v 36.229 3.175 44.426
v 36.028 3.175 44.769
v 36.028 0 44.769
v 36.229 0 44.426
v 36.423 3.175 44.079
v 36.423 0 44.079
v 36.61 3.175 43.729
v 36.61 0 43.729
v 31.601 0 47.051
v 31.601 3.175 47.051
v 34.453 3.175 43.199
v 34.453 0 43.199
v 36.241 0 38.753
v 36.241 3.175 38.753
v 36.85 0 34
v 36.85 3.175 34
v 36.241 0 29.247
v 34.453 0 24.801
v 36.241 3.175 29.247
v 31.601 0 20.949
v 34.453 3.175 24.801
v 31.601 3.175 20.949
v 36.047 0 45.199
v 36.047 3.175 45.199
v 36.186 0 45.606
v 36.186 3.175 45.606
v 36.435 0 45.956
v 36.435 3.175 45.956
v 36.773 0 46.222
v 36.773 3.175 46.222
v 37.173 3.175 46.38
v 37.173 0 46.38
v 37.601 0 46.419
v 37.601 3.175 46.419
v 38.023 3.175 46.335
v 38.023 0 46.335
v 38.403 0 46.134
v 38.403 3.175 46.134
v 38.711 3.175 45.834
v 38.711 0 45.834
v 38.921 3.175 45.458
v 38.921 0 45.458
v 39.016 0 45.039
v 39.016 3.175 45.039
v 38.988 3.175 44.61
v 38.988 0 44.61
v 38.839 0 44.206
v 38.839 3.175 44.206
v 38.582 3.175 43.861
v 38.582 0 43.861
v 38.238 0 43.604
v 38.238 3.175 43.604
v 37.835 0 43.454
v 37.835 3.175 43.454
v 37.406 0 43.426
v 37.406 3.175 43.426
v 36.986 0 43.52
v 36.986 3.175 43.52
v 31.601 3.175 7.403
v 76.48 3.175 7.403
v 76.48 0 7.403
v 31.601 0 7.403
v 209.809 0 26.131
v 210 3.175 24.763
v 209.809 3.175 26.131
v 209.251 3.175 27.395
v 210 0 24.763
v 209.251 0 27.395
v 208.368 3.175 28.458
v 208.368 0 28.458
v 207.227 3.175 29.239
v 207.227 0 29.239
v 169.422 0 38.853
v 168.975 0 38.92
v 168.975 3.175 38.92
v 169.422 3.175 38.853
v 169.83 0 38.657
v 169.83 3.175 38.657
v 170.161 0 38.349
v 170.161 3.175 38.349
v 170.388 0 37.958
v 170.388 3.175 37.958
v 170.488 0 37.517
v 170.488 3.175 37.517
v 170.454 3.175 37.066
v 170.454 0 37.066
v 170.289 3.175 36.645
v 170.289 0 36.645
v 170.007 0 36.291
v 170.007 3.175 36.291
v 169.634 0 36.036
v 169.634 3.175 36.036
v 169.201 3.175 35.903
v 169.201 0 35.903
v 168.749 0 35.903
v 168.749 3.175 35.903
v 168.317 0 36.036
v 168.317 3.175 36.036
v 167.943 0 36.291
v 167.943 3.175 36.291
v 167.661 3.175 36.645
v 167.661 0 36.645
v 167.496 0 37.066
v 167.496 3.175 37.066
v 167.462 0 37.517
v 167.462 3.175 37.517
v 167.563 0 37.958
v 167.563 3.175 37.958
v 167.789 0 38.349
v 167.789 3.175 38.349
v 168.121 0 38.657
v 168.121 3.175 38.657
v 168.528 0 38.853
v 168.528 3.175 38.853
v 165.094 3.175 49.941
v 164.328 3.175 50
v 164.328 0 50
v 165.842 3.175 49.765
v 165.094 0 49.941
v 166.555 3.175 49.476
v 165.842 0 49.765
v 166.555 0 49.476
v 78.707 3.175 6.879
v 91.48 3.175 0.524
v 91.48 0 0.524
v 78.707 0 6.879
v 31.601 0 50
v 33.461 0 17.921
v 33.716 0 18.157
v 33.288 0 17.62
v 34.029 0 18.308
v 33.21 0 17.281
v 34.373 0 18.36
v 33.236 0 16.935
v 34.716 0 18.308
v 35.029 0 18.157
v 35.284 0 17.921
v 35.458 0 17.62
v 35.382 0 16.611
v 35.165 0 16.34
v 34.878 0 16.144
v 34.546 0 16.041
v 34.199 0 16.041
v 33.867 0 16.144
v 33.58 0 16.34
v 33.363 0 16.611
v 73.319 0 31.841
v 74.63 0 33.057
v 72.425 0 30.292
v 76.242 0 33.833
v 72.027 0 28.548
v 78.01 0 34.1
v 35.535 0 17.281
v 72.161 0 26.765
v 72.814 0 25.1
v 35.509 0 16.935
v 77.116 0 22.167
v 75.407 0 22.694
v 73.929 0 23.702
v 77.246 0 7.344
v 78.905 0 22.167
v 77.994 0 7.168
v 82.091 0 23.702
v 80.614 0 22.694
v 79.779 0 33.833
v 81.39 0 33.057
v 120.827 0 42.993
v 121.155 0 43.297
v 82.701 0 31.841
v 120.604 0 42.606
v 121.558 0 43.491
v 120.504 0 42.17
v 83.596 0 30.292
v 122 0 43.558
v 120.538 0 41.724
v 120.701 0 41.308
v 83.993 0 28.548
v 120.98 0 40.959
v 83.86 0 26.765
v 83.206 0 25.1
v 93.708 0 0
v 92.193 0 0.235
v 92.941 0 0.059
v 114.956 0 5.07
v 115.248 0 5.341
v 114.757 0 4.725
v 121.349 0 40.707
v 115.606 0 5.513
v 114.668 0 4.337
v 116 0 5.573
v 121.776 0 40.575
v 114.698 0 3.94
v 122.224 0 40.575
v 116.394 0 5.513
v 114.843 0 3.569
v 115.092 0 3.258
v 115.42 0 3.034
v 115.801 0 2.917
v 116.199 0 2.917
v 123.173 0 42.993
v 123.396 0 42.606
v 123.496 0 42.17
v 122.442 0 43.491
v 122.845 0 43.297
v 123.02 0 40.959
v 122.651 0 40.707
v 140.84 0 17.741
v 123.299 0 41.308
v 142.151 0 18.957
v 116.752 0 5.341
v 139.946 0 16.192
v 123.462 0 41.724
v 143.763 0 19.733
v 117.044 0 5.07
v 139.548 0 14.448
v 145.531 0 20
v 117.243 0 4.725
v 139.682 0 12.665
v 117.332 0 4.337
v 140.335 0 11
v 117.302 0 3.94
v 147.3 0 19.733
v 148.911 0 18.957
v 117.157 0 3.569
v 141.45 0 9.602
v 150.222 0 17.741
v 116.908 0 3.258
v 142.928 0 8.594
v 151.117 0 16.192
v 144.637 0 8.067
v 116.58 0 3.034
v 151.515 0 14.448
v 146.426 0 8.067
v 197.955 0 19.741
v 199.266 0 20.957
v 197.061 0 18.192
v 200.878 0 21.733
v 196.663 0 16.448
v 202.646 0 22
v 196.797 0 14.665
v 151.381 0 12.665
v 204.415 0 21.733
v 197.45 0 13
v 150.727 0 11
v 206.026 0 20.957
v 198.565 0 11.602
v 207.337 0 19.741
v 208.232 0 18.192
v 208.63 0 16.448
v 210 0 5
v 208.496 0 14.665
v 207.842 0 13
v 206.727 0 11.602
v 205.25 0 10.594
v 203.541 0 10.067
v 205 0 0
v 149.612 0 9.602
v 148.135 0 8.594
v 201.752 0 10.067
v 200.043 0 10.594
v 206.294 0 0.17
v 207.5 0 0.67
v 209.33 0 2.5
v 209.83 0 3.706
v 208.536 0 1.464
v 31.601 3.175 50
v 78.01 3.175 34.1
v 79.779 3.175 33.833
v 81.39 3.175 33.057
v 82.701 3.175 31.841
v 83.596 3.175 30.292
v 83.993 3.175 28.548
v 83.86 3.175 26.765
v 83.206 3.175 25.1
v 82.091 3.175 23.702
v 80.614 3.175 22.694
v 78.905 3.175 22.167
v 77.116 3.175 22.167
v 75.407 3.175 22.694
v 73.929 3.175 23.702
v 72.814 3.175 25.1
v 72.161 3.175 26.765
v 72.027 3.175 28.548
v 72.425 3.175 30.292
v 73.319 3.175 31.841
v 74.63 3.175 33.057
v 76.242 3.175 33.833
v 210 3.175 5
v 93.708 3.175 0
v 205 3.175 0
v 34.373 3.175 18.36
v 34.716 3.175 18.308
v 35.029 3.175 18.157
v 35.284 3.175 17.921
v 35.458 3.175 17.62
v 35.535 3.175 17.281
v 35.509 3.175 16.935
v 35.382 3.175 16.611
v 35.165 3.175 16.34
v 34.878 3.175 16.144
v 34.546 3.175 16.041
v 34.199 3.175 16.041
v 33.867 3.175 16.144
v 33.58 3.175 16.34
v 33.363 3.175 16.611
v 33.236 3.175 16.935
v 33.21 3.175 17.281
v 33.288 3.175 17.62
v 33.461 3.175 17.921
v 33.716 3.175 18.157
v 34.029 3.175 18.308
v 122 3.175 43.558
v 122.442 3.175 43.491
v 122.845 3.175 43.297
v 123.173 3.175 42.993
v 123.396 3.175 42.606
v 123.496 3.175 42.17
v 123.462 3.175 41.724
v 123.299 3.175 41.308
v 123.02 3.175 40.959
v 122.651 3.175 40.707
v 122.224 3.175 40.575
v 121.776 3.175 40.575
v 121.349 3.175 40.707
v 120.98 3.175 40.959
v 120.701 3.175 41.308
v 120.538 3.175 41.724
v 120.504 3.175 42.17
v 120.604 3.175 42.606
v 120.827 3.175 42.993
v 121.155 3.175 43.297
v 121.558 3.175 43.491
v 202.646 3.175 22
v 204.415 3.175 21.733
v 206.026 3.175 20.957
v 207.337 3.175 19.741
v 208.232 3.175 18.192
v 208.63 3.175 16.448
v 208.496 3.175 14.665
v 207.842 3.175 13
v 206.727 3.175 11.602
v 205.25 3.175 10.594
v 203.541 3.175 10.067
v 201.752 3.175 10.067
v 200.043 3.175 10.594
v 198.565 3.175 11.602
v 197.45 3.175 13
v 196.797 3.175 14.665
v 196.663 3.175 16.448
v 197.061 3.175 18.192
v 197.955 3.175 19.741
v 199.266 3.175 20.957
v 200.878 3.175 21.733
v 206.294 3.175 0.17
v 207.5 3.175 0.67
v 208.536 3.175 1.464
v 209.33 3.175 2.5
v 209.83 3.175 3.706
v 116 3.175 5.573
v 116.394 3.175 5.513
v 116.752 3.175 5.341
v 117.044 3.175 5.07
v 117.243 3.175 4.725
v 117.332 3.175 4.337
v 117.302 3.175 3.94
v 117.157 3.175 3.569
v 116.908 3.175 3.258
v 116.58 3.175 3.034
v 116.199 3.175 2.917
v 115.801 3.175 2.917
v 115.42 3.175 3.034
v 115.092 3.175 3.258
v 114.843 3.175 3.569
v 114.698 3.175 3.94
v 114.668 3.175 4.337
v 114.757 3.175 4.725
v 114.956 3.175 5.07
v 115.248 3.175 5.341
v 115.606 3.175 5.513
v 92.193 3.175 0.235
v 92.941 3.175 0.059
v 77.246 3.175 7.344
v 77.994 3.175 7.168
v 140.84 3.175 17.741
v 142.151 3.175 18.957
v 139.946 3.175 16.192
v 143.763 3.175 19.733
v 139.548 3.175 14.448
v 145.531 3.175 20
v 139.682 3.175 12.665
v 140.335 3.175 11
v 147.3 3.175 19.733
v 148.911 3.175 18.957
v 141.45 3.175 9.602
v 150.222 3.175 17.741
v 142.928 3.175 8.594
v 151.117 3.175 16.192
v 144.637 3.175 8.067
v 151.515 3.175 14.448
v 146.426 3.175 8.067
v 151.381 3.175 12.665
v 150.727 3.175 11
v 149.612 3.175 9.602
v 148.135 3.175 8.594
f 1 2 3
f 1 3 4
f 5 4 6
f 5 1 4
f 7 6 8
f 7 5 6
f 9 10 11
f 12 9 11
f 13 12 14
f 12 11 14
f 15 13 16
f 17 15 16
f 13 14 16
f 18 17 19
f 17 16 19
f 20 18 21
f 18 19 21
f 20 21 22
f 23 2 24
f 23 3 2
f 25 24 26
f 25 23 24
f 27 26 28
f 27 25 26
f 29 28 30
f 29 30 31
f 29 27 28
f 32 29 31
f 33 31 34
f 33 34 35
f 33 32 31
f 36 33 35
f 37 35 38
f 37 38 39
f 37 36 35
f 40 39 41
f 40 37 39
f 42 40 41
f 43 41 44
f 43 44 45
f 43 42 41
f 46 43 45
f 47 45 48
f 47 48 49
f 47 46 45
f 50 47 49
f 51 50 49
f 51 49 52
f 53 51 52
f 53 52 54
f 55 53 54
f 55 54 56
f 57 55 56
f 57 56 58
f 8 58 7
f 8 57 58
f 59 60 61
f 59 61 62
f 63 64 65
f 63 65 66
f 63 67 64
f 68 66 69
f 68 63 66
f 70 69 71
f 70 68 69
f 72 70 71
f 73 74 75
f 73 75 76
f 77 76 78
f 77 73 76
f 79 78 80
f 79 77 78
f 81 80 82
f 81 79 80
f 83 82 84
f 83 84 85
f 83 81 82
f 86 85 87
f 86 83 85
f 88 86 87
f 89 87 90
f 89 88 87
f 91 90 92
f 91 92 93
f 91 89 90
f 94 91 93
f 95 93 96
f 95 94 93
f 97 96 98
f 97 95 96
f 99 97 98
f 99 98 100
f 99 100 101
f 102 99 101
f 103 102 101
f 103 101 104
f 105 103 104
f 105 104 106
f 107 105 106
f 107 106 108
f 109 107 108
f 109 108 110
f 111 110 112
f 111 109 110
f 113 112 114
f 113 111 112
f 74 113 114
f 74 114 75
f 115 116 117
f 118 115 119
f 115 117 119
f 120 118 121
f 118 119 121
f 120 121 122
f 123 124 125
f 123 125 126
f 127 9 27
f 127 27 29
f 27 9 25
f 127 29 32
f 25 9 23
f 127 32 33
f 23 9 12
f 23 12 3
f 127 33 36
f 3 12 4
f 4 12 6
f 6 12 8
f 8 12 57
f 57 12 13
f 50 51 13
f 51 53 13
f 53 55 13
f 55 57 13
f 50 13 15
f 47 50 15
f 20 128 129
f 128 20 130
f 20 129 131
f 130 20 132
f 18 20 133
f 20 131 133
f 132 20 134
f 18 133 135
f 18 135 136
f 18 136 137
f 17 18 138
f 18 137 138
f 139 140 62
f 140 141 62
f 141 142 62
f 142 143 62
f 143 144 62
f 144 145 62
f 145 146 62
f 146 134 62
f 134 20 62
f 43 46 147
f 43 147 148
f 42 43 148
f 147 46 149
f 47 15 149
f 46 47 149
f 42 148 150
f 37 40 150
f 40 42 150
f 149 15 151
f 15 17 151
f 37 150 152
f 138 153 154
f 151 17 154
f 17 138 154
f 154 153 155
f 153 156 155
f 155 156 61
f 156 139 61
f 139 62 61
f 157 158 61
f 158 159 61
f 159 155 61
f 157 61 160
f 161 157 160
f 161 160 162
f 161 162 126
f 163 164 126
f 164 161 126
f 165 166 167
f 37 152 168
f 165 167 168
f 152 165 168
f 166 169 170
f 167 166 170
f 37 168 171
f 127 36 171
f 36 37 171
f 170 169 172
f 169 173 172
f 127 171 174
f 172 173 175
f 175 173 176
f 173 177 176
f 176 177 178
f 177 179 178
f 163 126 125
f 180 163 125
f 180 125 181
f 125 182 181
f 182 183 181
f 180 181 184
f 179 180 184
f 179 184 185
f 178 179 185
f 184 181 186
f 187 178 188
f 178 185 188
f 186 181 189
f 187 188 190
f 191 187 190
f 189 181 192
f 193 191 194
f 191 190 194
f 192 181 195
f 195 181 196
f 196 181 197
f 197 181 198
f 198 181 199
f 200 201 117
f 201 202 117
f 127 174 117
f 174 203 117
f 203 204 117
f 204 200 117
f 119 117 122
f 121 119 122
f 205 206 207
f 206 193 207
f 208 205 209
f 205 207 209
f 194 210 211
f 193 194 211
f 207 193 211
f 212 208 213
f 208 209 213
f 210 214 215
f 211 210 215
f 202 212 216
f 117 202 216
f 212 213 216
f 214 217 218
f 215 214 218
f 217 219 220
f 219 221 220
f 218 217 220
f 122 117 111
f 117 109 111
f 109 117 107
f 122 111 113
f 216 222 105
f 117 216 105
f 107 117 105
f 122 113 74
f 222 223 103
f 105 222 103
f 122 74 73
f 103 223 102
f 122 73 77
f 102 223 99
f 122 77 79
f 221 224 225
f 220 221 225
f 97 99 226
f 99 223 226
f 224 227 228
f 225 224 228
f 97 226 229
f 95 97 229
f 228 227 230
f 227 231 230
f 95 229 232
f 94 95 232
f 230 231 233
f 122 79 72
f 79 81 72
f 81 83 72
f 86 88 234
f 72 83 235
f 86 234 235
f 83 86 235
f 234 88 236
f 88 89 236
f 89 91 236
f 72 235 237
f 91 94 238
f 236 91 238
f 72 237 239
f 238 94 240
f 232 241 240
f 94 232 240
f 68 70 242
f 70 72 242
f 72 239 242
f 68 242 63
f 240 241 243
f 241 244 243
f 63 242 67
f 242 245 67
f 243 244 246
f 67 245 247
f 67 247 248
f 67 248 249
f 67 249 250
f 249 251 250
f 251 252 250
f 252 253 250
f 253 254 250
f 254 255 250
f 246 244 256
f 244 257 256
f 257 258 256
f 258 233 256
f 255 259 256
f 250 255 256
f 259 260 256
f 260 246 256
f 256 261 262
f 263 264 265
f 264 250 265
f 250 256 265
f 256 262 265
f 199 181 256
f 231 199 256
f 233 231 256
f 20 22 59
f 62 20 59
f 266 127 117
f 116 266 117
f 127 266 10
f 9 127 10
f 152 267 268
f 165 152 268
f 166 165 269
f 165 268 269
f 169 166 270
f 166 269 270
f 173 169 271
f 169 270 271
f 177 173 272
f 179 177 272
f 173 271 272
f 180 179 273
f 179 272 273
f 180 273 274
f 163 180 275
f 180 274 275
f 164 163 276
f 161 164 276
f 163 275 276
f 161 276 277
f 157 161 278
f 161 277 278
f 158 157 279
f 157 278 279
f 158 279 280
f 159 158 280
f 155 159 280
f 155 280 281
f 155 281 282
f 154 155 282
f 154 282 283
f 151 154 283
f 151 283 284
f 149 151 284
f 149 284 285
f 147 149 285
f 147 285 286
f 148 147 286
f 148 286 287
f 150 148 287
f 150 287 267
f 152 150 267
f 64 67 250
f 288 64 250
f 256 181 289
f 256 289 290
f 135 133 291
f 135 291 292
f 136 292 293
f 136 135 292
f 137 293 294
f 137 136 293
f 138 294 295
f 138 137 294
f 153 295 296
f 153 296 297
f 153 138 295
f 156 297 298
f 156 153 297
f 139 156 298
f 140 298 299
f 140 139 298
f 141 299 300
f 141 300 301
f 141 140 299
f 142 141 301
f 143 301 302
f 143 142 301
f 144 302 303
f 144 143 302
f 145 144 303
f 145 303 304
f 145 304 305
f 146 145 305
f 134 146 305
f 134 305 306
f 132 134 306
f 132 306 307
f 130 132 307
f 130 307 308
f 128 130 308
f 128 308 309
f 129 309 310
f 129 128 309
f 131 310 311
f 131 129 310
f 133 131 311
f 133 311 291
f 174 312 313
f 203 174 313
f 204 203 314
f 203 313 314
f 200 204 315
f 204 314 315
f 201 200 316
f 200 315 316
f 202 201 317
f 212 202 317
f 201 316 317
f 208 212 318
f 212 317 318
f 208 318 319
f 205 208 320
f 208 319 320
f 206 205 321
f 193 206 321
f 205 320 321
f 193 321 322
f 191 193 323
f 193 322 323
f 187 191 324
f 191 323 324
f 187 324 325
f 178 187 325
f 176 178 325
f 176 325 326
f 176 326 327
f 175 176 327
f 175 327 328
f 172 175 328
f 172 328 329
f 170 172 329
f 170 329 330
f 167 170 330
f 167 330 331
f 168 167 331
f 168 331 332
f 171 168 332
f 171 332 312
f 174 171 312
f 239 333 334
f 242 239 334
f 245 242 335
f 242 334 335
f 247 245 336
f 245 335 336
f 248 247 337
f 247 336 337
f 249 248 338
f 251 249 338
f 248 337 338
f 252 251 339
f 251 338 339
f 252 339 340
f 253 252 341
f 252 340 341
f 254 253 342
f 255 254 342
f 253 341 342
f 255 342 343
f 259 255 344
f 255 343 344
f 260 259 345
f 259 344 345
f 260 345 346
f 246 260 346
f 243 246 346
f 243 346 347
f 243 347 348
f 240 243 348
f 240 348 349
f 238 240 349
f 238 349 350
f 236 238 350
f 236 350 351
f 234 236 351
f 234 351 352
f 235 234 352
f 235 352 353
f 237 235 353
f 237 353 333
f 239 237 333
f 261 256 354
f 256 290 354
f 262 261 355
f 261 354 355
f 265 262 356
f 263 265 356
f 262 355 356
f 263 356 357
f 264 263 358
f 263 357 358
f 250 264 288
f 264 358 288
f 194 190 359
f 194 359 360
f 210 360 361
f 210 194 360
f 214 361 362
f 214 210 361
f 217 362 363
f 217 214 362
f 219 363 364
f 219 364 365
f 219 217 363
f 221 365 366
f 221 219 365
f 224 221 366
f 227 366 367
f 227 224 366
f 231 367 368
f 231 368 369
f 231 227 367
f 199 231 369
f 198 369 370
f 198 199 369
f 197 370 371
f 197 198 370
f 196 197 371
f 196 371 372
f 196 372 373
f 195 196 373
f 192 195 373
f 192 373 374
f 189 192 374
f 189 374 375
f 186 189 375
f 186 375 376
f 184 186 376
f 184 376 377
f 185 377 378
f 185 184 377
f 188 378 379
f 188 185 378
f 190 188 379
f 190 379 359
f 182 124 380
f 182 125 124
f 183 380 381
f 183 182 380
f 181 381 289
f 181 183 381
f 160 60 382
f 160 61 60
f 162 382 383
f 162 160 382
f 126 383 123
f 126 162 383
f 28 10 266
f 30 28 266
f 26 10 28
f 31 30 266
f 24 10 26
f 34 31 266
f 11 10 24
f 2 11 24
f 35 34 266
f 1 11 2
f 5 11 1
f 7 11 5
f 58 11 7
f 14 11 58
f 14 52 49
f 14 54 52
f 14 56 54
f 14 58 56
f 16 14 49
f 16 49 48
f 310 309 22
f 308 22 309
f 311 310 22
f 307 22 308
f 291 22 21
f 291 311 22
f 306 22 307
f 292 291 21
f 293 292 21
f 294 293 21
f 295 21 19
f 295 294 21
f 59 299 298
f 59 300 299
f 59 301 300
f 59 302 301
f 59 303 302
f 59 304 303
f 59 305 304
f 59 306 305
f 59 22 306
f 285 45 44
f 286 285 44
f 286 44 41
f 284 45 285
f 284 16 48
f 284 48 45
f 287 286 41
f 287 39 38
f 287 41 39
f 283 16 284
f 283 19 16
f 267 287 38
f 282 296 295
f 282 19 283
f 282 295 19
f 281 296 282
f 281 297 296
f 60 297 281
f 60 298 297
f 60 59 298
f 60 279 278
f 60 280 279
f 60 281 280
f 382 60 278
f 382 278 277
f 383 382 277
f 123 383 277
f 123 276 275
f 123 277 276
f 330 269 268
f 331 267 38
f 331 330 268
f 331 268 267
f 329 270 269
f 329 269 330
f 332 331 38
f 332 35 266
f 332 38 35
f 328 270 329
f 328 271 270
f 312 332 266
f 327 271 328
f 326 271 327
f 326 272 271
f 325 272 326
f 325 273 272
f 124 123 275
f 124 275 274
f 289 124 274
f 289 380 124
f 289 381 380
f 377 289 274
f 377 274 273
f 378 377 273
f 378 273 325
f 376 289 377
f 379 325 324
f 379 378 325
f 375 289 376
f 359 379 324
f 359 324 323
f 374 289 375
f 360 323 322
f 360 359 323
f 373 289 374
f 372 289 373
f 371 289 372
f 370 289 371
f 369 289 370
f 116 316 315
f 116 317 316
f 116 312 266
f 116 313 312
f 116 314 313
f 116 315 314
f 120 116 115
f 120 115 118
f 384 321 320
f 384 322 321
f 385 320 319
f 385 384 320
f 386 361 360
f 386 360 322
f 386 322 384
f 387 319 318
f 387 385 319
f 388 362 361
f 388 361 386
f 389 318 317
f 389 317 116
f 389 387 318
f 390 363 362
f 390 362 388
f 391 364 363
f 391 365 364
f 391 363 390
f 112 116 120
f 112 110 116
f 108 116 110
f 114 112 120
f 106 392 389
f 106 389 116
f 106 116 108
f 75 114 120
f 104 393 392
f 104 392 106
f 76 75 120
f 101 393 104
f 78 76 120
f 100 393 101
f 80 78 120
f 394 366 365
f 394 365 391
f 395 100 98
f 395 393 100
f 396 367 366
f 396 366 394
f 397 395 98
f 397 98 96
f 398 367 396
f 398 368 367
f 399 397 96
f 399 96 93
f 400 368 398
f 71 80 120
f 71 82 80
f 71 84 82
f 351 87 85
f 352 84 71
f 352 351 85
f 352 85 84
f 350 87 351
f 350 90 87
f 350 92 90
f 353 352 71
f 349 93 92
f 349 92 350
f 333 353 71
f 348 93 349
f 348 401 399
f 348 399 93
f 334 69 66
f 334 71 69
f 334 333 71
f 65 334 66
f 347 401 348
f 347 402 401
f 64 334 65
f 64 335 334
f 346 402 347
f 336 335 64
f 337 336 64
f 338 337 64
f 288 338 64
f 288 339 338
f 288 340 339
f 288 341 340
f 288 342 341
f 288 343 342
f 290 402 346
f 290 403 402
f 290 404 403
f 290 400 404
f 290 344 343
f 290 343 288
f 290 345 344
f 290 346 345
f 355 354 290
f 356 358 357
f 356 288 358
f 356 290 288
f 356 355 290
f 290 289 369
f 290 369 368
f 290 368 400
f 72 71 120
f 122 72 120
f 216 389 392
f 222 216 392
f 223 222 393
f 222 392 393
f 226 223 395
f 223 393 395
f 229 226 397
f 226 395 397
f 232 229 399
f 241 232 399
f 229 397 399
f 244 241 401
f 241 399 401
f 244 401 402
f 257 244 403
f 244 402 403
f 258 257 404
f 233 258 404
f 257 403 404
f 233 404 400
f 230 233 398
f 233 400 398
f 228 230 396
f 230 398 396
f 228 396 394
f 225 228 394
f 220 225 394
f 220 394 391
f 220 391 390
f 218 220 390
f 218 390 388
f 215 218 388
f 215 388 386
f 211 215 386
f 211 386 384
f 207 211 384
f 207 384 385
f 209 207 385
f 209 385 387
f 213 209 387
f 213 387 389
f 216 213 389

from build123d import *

# Parameters (mm, degrees)
SKETCH1_W           = 210
SKETCH1_H           = 50
SKETCH1_R           = 1.211665018
SKETCH1_R_2         = 1.165617118
SKETCH1_R_3         = 1.5
SKETCH1_R_4         = 1.517273905
SKETCH1_R_5         = 1.335614121
SKETCH1_R_6         = 1.62438417
BOSS_EXTRUDE1_DEPTH = 3.175
SKETCH2_R           = 2
CUT_EXTRUDE1_DEPTH  = 10
SKETCH3_R           = 6
SKETCH3_R_2         = 0.586995366
CUT_EXTRUDE2_DEPTH  = 57.15
CUT_EXTRUDE7_DEPTH  = 10
FILLET3_R           = 5
SKETCH11_R          = 18.5
SKETCH11_R_2        = 2
BOSS_EXTRUDE4_DEPTH = 3.175
SKETCH12_R          = 21
BOSS_EXTRUDE5_DEPTH = 3.175
SKETCH13_R          = 18.85
CUT_EXTRUDE8_DEPTH  = 3.175
BOSS_EXTRUDE6_DEPTH = 3.175
FILLET4_R           = 5
SKETCH15_R          = 1.5
CUT_EXTRUDE9_DEPTH  = 10
SKETCH16_R          = 1.5
CUT_EXTRUDE10_DEPTH = 10
SKETCH17_R          = 1.5
CUT_EXTRUDE11_DEPTH = 10
CUT_EXTRUDE12_DEPTH = 10


with BuildPart() as part:
    # Sketch1 → Boss-Extrude1 (new body)
    with BuildSketch(Plane(origin=(0, 0, 0), x_dir=(1, 0, 0), z_dir=(0, 1, 0))):
        with Locations((105, -25)):
            Rectangle(SKETCH1_W, SKETCH1_H)
        with Locations(Location((3.489526233, -16.787661112, 0), (0, 0, 270))):
            Circle(SKETCH1_R, mode=Mode.SUBTRACT)
        with Locations(Location((34.37258772, -17.194005245, 0), (0, 0, 270))):
            Circle(SKETCH1_R_2, mode=Mode.SUBTRACT)
        with Locations(Location((37.520749958, -44.921198121, 0), (0, 0, 270))):
            Circle(SKETCH1_R_3, mode=Mode.SUBTRACT)
        with Locations(Location((168.975233936, -37.403209633, 0), (0, 0, 270))):
            Circle(SKETCH1_R_4, mode=Mode.SUBTRACT)
        with Locations(Location((116, -4.237214774, 0), (0, 0, 270))):
            Circle(SKETCH1_R_5, mode=Mode.SUBTRACT)
        with Locations(Location((12.257640281, -3.274812063, 0), (0, 0, 270))):
            Circle(SKETCH1_R_6, mode=Mode.SUBTRACT)
    extrude(amount=BOSS_EXTRUDE1_DEPTH)

    # Sketch2 → Cut-Extrude1 (cut)
    with BuildSketch(Plane(origin=(0, 3.175, 0), x_dir=(1, 0, 0), z_dir=(0, 1, 0))):
        with Locations(Location((10, -26, 0), (0, 0, 270))):
            Circle(SKETCH2_R)
        with Locations(Location((10, -42, 0), (0, 0, 270))):
            Circle(SKETCH2_R)
        with Locations(Location((26, -26, 0), (0, 0, 270))):
            Circle(SKETCH2_R)
        with Locations(Location((26, -42, 0), (0, 0, 270))):
            Circle(SKETCH2_R)
    extrude(amount=-CUT_EXTRUDE1_DEPTH, mode=Mode.SUBTRACT)

    # Sketch3 → Cut-Extrude2 (cut)
    with BuildSketch(Plane(origin=(0, 3.175, 0), x_dir=(1, 0, 0), z_dir=(0, 1, 0))):
        with Locations(Location((78.01026379, -28.1, 0), (0, 0, 270))):
            Circle(SKETCH3_R)
        with Locations(Location((145.531297368, -14, 0), (0, 0, 270))):
            Circle(SKETCH3_R)
        with Locations(Location((18, -34, 0), (0, 0, 270))):
            Circle(SKETCH3_R_2)
        with Locations(Location((202.646291021, -16, 0), (0, 0, 270))):
            Circle(SKETCH3_R)
    extrude(amount=-CUT_EXTRUDE2_DEPTH, mode=Mode.SUBTRACT)

    # Sketch10 → Cut-Extrude7 (cut)
    with BuildSketch(Plane(origin=(0, 3.175, 0), x_dir=(1, 0, 0), z_dir=(0, 1, 0))):
        Polygon((210, -27.859435908), (165.502877994, -50), (210, -50), align=None)
        Polygon((92.532613397, 0), (77.65477062, -7.402812063), (0, -7.402812063), (0, 0), align=None)
    extrude(amount=-CUT_EXTRUDE7_DEPTH, mode=Mode.SUBTRACT)

    # Fillet3
    fillet3_edges = [part.edges().sort_by_distance(p)[0] for p in [
        (210, 1.5875, 0),
        (0, 1.5875, 50),
        (92.532613397, 1.5875, 0),
        (210, 1.5875, 27.859435908),
        (165.502877994, 1.5875, 50),
        (77.65477062, 1.5875, 7.402812063),
        (0, 1.5875, 7.402812063),
    ]]
    fillet(fillet3_edges, radius=FILLET3_R)

    # Sketch11 → Boss-Extrude4 (add)
    with BuildSketch(Plane(origin=(0, 3.175, 0), x_dir=(1, 0, 0), z_dir=(0, 1, 0))):
        with Locations((18, -34)):
            Circle(SKETCH11_R)
        with Locations(Location((10, -26, 0), (0, 0, 270))):
            Circle(SKETCH11_R_2, mode=Mode.SUBTRACT)
        with Locations(Location((10, -42, 0), (0, 0, 270))):
            Circle(SKETCH11_R_2, mode=Mode.SUBTRACT)
        with Locations(Location((26, -26, 0), (0, 0, 270))):
            Circle(SKETCH11_R_2, mode=Mode.SUBTRACT)
        with Locations(Location((26, -42, 0), (0, 0, 270))):
            Circle(SKETCH11_R_2, mode=Mode.SUBTRACT)
    extrude(amount=-BOSS_EXTRUDE4_DEPTH)

    # Sketch12 → Boss-Extrude5 (add)
    with BuildSketch(Plane(origin=(0, 3.175, 0), x_dir=(1, 0, 0), z_dir=(0, 1, 0))):
        with Locations((18, -34)):
            Circle(SKETCH12_R)
    extrude(amount=-BOSS_EXTRUDE5_DEPTH)

    # Sketch13 → Cut-Extrude8 (cut)
    with BuildSketch(Plane(origin=(0, 3.175, 0), x_dir=(1, 0, 0), z_dir=(0, 1, 0))):
        with Locations(Location((18, -34, 0), (0, 0, 270))):
            Circle(SKETCH13_R)
    extrude(amount=-CUT_EXTRUDE8_DEPTH, mode=Mode.SUBTRACT)

    # Sketch14 → Boss-Extrude6 (add)
    with BuildSketch(Plane(origin=(0, 3.175, 0), x_dir=(1, 0, 0), z_dir=(0, 1, 0))):
        with BuildLine():
            Line((-35.83, -34.272812063), (-2.998227868, -34.272812063))
            ThreePointArc((-2.998227868, -34.272812063), (-2.272136238, -28.519079241), (0, -23.183346174))
            Line((0, -23.183346174), (0, -12.402812063))
            Line((0, -12.402812063), (0, -12.248529085))
            Line((0, -12.248529085), (0, 0.727187937))
            Line((0, 0.727187937), (-35.83, 0.727187937))
            Line((-35.83, 0.727187937), (-35.83, -34.272812063))
        make_face()
        with BuildLine():
            Line((0, 0.727187937), (0, -12.248529085))
            Line((0, -12.248529085), (0.002380891, -12.248529085))
            ThreePointArc((0.002380891, -12.248529085), (1.51944077, -8.813145304), (5, -7.402812063))
            Line((5, -7.402812063), (18, -7.402812063))
            Line((18, -7.402812063), (18, 0.727187937))
            Line((18, 0.727187937), (0, 0.727187937))
        make_face()
    extrude(amount=-BOSS_EXTRUDE6_DEPTH)

    # Fillet4
    fillet4_edges = [part.edges().sort_by_distance(p)[0] for p in [
        (-35.83, 1.5875, 34.272812063),
        (-35.83, 1.5875, -0.727187937),
        (18, 1.5875, -0.727187937),
    ]]
    fillet(fillet4_edges, radius=FILLET4_R)

    # Sketch15 → Cut-Extrude9 (cut)
    with BuildSketch(Plane(origin=(0, 3.175, 0), x_dir=(1, 0, 0), z_dir=(0, 1, 0))):
        with Locations(Location((122, -42.058139805, 0), (0, 0, 270))):
            Circle(SKETCH15_R)
    extrude(amount=-CUT_EXTRUDE9_DEPTH, mode=Mode.SUBTRACT)

    # Sketch16 → Cut-Extrude10 (cut)
    with BuildSketch(Plane(origin=(0, 3.175, 0), x_dir=(1, 0, 0), z_dir=(0, 1, 0))):
        with Locations(Location((12, -3.272812063, 0), (0, 0, 270))):
            Circle(SKETCH16_R)
    extrude(amount=-CUT_EXTRUDE10_DEPTH, mode=Mode.SUBTRACT)

    # Sketch17 → Cut-Extrude11 (cut)
    with BuildSketch(Plane(origin=(0, 3.175, 0), x_dir=(1, 0, 0), z_dir=(0, 1, 0))):
        with Locations(Location((-30.83, -15.772812063, 0), (0, 0, 270))):
            Circle(SKETCH17_R)
    extrude(amount=-CUT_EXTRUDE11_DEPTH, mode=Mode.SUBTRACT)

    # Sketch18 → Cut-Extrude12 (cut)
    with BuildSketch(Plane(origin=(0, 3.175, 0), x_dir=(1, 0, 0), z_dir=(0, 1, 0))):
        Polygon((31.601470509, -50), (31.601470509, 19.941328263), (-46.231581419, 19.941328263), (-46.231581419, -56.249580014), (31.601470509, -57.692191912), align=None)
    extrude(amount=-CUT_EXTRUDE12_DEPTH, mode=Mode.SUBTRACT)


solid = part.part
